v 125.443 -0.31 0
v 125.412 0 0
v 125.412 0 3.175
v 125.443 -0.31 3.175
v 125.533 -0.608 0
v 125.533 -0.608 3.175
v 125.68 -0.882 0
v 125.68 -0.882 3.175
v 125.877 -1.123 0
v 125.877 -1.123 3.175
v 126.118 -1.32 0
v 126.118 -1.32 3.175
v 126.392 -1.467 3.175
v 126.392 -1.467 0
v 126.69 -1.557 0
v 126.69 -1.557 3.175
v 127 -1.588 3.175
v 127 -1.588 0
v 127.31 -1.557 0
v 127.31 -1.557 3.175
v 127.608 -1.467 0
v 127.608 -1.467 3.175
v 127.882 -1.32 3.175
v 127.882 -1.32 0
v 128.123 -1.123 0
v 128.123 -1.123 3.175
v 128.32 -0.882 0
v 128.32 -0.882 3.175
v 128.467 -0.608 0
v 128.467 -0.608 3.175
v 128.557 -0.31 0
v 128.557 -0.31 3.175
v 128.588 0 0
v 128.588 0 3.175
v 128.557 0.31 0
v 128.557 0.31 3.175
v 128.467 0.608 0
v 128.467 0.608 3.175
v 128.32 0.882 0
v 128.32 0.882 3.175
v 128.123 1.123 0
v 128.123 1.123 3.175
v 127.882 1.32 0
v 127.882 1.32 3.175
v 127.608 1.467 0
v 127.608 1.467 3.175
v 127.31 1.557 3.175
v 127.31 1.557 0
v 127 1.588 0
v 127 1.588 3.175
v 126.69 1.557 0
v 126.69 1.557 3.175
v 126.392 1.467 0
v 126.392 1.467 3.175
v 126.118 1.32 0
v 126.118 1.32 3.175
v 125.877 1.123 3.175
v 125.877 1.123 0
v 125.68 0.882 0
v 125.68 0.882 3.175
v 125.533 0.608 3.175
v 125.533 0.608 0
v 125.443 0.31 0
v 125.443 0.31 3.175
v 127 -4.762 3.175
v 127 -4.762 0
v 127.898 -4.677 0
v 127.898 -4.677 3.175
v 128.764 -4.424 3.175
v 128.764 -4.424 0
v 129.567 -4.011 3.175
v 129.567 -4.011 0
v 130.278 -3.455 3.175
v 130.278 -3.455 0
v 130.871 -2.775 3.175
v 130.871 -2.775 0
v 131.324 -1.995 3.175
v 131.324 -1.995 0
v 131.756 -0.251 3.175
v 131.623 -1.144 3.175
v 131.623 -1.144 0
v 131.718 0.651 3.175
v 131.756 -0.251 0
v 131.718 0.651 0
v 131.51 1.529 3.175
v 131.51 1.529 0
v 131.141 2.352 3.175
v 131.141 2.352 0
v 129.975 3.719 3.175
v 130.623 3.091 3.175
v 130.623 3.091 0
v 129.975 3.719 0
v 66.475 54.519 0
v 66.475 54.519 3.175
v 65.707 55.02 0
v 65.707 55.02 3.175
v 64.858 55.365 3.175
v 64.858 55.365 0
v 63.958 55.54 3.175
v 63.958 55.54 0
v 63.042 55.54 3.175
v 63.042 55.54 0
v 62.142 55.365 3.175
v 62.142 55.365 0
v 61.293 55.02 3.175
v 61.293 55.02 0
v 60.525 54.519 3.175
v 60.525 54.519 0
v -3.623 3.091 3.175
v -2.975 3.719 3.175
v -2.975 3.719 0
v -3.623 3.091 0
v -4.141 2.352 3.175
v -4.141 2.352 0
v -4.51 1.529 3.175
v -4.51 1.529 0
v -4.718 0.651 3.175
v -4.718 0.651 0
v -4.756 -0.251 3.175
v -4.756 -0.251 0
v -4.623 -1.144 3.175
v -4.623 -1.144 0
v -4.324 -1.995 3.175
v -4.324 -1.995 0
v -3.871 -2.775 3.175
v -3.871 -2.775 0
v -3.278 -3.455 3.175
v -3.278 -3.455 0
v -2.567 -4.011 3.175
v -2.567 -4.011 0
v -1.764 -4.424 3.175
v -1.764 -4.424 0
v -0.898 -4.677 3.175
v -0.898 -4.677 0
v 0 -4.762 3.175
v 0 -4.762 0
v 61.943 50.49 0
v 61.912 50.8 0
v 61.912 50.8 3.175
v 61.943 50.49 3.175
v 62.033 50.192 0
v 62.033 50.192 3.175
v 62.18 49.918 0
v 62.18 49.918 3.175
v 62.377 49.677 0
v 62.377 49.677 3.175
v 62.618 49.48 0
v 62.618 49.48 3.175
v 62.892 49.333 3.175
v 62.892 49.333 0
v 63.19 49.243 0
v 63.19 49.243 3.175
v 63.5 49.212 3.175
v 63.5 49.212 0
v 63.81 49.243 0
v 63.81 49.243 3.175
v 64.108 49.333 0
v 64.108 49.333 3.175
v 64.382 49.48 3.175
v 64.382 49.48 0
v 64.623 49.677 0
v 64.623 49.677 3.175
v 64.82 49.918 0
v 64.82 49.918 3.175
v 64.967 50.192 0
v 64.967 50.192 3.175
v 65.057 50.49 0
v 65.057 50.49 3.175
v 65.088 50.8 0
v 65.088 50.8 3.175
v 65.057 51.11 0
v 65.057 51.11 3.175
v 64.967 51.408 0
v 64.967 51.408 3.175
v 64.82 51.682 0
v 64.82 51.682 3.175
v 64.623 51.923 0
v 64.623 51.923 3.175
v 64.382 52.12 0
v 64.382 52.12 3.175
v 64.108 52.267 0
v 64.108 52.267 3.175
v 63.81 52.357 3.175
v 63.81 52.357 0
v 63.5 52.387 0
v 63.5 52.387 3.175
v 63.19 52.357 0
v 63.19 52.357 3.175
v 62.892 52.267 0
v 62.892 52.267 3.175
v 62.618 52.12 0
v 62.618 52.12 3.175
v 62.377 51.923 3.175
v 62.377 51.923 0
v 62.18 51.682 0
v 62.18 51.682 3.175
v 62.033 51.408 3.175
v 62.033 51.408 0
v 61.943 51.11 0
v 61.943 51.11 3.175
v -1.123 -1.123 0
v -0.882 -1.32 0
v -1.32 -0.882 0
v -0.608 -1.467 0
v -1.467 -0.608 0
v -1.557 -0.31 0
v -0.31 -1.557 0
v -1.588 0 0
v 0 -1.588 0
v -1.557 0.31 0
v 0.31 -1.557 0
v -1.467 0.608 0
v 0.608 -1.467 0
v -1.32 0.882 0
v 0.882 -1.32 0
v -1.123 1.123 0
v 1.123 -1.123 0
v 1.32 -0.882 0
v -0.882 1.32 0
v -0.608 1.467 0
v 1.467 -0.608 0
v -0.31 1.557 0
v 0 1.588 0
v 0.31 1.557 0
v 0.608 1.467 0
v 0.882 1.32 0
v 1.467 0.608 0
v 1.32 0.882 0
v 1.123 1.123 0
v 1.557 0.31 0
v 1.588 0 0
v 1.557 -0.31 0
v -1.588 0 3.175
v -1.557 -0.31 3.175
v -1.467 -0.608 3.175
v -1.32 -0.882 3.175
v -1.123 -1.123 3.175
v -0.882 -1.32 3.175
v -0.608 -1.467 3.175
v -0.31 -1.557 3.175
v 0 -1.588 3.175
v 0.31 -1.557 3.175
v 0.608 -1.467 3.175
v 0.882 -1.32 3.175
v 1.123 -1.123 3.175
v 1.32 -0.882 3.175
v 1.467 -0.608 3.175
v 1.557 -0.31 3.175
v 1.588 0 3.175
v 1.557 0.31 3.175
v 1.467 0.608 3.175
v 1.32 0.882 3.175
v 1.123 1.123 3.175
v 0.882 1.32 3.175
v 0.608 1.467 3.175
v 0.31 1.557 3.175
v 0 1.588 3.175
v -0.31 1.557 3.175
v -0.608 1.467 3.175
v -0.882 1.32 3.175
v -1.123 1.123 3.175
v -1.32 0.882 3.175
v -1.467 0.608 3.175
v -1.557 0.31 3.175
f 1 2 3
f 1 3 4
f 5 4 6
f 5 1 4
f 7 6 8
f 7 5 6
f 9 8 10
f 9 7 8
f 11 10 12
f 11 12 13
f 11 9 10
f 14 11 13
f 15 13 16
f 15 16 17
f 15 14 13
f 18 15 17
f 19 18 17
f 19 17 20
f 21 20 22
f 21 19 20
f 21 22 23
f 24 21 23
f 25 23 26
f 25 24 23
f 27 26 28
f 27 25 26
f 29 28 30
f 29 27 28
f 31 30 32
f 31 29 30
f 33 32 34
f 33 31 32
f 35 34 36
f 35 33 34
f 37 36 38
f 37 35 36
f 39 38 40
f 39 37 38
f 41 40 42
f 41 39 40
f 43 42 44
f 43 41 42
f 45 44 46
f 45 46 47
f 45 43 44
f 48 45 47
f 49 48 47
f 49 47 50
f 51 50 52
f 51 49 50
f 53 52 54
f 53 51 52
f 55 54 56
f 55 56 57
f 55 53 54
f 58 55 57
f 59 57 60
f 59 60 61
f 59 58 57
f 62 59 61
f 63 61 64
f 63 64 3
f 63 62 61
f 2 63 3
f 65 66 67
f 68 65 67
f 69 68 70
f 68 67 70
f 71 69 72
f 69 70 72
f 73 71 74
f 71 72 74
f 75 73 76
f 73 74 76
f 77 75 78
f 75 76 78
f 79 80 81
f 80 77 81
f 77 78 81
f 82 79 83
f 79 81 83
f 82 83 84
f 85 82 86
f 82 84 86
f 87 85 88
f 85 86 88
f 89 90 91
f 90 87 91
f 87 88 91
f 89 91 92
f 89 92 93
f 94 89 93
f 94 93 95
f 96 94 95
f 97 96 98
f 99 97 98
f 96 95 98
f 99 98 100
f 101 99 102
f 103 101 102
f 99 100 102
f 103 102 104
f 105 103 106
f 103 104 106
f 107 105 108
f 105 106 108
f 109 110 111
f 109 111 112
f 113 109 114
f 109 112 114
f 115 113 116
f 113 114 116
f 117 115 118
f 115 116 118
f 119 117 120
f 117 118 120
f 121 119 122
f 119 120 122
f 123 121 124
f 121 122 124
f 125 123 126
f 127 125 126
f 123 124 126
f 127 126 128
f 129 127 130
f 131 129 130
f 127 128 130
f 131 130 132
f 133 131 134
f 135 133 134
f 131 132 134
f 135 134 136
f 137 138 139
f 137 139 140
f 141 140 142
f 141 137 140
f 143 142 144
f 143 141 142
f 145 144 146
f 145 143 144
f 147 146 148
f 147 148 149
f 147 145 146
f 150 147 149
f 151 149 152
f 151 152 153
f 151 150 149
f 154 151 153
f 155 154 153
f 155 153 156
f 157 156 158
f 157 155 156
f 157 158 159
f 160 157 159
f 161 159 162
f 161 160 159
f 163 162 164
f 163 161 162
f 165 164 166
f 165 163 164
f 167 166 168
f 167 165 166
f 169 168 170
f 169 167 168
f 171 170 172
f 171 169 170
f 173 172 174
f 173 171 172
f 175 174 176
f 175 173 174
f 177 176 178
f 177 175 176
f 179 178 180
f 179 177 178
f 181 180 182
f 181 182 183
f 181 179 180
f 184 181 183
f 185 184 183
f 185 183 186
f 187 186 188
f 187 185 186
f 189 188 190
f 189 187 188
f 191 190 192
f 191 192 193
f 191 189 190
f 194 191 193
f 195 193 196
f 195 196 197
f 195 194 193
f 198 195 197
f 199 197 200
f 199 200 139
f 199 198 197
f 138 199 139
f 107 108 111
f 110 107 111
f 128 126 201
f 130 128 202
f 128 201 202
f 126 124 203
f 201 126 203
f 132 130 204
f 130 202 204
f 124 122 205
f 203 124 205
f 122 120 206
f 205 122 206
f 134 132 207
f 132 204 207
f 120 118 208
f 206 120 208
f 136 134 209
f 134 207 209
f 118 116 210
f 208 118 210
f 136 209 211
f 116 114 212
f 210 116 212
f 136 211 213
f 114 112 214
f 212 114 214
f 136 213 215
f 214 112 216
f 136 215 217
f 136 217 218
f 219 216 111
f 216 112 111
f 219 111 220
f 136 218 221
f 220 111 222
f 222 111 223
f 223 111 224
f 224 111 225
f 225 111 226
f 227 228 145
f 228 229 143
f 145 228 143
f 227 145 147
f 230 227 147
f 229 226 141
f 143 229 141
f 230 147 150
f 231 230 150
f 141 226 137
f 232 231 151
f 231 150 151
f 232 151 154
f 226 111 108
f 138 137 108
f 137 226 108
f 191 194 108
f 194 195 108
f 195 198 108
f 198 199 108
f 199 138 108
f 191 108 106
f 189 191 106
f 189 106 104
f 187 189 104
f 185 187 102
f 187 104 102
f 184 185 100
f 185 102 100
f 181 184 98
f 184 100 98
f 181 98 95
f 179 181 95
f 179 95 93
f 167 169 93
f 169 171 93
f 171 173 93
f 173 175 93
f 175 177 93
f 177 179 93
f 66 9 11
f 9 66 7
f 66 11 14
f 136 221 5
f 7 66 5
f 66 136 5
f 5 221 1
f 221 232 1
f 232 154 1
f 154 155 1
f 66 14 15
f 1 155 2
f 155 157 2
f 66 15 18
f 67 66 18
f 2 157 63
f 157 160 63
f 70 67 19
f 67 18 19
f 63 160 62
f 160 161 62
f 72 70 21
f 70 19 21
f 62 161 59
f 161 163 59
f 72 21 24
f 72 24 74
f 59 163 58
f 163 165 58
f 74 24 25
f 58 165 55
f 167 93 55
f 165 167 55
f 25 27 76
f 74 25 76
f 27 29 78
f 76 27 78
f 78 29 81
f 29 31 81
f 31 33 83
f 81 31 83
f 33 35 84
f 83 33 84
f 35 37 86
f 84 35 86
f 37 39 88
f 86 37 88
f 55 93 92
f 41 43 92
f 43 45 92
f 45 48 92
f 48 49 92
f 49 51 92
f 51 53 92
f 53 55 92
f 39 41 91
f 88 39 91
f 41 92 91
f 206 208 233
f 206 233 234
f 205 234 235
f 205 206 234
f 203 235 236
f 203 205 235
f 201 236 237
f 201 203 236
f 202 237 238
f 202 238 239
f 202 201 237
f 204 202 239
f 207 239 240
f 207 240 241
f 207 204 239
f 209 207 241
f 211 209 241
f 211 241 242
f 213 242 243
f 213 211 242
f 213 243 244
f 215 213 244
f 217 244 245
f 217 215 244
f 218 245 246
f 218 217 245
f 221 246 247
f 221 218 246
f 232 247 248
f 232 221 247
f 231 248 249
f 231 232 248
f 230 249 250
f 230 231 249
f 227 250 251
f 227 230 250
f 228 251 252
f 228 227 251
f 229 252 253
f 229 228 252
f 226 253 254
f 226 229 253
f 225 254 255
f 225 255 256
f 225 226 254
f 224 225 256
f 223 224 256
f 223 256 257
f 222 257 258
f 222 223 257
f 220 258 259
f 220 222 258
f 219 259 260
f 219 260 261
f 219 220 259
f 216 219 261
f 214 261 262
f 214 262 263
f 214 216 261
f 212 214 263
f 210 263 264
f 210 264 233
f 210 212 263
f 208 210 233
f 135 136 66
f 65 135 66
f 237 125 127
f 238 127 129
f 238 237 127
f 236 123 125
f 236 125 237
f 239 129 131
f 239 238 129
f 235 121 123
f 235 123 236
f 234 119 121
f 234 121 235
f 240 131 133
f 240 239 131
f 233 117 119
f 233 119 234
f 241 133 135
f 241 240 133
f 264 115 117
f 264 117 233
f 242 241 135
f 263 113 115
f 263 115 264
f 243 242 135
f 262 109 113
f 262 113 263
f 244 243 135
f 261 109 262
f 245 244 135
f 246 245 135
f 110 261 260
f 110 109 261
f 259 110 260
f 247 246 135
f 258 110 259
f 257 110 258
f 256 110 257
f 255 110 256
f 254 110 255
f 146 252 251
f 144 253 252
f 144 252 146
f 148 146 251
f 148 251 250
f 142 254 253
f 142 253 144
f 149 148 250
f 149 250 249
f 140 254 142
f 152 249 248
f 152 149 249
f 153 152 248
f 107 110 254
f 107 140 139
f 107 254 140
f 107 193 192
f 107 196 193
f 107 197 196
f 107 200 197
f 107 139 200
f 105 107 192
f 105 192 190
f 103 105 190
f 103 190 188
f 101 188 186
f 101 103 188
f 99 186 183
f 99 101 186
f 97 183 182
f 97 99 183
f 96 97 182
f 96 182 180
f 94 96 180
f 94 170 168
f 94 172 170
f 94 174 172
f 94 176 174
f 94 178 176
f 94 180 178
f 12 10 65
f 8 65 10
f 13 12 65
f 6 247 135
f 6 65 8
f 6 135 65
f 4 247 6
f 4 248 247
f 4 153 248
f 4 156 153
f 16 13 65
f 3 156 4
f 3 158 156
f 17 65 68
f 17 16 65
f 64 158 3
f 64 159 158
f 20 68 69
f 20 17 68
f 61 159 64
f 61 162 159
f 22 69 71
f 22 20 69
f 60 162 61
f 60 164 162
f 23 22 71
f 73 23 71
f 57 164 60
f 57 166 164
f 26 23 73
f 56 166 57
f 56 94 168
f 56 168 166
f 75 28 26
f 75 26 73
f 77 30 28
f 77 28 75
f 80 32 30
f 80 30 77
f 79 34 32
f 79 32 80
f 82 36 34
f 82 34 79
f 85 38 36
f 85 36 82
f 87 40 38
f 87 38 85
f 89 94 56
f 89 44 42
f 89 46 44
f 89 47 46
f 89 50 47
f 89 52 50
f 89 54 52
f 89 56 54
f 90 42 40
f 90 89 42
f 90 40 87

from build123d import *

# Parameters (mm, degrees)
SKETCH1_R           = 4.7625
SKETCH1_R_2         = 1.5875
BOSS_EXTRUDE1_DEPTH = 3.175


with BuildPart() as part:
    # Sketch1 → Boss-Extrude1 (new body)
    # profile 1 of 4: a face of its own
    with BuildSketch(Plane.XY):
        with BuildLine():
            ThreePointArc((68.2625, 50.8), (61.436938671, 46.507543337), (60.524889836, 54.518887705))
            Line((60.524889836, 54.518887705), (-2.975110164, 3.718887705))
            ThreePointArc((-2.975110164, 3.718887705), (2.063061329, 4.292456663), (4.7625, 0))
            ThreePointArc((4.7625, 0), (3.367596045, -3.367596045), (0, -4.7625))
            Line((0, -4.7625), (127, -4.7625))
            ThreePointArc((127, -4.7625), (122.50597013, 1.576420559), (129.975110164, 3.718887705))
            Line((129.975110164, 3.718887705), (66.475110164, 54.518887705))
            ThreePointArc((66.475110164, 54.518887705), (67.792456663, 52.863061329), (68.2625, 50.8))
        make_face()
    # profile 2 of 4: a face of its own
    with BuildSketch(Plane.XY):
        Circle(SKETCH1_R)
        with Locations(Location((0, 0, 0), (0, 0, 180))):
            Circle(SKETCH1_R_2, mode=Mode.SUBTRACT)
    # profile 3 of 4: a face of its own
    with BuildSketch(Plane.XY):
        with Locations((63.5, 50.8)):
            Circle(SKETCH1_R)
        with Locations(Location((63.5, 50.8, 0), (0, 0, 180))):
            Circle(SKETCH1_R_2, mode=Mode.SUBTRACT)
    # profile 4 of 4: a face of its own
    with BuildSketch(Plane.XY):
        with Locations((127, 0)):
            Circle(SKETCH1_R)
        with Locations(Location((127, 0, 0), (0, 0, 180))):
            Circle(SKETCH1_R_2, mode=Mode.SUBTRACT)
    extrude(amount=BOSS_EXTRUDE1_DEPTH)


solid = part.part
